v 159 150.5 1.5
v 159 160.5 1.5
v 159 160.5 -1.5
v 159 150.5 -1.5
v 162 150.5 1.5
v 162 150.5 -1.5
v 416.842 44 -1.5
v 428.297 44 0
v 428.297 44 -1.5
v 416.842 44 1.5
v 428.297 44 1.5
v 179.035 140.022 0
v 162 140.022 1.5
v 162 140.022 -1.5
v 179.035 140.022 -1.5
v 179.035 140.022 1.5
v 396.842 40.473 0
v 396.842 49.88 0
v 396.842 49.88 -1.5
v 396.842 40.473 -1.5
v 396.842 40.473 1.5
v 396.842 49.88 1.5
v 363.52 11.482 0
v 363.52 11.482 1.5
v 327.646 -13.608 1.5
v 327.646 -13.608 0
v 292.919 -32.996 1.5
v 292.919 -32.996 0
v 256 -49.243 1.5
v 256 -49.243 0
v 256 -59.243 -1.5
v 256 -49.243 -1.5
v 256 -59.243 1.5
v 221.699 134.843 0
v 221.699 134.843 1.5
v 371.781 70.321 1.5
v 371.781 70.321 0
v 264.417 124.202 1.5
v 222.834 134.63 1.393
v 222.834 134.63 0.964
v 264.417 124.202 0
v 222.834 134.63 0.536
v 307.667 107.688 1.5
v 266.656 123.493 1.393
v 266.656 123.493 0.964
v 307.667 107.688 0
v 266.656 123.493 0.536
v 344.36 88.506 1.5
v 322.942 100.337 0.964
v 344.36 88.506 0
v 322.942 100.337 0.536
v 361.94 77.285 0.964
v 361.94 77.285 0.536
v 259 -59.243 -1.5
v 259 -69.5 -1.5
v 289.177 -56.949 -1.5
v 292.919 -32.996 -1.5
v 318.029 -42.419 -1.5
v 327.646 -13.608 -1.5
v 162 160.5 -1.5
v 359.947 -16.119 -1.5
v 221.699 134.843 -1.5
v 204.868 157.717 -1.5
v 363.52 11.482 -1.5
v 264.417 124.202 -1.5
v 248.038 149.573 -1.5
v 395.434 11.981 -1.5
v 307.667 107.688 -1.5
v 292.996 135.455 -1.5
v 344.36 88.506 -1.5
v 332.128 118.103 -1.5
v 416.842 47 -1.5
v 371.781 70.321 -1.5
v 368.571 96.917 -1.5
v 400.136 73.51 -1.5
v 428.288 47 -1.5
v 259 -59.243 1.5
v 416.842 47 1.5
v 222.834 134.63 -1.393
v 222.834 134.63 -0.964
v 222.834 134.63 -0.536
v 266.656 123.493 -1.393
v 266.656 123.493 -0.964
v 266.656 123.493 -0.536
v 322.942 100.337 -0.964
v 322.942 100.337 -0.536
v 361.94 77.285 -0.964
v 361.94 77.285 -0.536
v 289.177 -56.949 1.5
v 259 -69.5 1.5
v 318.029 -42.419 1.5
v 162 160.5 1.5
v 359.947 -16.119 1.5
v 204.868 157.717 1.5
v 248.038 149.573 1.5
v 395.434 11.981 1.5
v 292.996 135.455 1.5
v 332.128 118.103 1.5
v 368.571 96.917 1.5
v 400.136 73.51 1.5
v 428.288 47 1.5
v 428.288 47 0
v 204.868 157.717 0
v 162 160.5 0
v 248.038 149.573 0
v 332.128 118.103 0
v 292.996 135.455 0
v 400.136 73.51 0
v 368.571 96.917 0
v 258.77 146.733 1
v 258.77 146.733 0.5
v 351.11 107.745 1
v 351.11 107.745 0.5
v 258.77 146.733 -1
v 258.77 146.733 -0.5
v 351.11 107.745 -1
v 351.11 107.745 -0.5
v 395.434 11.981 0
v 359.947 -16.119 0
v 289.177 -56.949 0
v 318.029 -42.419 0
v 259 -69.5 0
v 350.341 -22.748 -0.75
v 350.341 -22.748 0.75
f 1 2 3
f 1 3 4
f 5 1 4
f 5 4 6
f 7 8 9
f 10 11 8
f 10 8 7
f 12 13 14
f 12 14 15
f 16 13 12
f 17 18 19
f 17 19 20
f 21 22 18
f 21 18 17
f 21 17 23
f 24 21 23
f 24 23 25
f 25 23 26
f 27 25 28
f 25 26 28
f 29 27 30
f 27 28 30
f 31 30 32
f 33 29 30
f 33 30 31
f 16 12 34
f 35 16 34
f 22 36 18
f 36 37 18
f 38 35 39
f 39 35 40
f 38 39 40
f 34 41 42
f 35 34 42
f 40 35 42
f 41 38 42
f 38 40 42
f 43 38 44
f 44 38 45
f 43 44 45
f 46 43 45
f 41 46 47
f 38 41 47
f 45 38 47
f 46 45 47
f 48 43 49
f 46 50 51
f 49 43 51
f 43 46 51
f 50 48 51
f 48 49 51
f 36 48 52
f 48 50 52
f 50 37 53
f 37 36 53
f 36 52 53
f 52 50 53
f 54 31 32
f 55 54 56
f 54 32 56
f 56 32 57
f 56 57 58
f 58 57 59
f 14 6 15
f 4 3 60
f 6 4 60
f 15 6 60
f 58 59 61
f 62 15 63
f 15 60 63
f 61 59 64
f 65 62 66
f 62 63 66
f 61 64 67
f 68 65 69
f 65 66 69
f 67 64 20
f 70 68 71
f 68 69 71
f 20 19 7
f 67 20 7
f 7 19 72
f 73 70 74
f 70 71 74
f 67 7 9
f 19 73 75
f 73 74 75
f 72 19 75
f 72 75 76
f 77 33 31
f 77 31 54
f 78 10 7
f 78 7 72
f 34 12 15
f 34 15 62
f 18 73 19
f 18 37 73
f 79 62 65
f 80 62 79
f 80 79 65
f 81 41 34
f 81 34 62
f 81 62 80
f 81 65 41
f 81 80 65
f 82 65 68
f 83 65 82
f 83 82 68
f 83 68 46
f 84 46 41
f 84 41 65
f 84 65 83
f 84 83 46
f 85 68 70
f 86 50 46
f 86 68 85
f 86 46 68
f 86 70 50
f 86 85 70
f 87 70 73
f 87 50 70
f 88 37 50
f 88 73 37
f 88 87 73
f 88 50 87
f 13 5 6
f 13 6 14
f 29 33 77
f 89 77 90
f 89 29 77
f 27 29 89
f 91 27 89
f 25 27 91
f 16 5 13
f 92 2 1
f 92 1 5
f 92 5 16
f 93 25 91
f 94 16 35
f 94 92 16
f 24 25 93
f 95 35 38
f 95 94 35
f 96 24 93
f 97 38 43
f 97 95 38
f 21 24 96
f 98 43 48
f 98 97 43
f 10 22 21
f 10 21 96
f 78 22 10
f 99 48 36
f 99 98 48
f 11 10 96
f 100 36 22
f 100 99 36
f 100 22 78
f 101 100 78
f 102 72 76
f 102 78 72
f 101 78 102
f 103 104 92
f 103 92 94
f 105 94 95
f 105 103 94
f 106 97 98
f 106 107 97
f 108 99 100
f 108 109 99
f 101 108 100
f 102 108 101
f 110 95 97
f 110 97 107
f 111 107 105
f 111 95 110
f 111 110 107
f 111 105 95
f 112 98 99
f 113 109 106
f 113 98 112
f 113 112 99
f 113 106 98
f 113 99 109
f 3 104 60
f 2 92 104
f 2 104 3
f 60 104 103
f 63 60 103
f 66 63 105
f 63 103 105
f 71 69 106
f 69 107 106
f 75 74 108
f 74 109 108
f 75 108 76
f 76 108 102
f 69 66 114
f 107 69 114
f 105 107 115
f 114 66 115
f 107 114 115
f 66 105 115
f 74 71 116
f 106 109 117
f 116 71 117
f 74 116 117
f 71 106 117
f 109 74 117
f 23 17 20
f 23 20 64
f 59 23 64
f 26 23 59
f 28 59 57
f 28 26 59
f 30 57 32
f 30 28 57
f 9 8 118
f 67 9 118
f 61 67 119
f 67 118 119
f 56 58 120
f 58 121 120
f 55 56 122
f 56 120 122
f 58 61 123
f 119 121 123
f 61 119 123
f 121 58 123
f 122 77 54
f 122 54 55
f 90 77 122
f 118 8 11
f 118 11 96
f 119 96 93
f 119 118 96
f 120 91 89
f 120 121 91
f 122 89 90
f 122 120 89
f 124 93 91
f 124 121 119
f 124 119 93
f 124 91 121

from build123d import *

# Parameters (mm, degrees)
BOSS_EXTRUDE1_DEPTH = 1.5


with BuildPart() as part:
    # Sketch1 → Boss-Extrude1 (new, symmetric)
    with BuildSketch(Plane.XY):
        with BuildLine():
            Line((162, 160.5), (159, 160.5))
            Line((159, 160.5), (159, 150.5))
            Line((159, 150.5), (162, 150.5))
            Line((162, 150.5), (162, 140.021619695))
            Line((162, 140.021619695), (179.035361639, 140.021619695))
            add(Edge.make_bspline(
                [(179.035361639, 140.021619695), (181.45177758, 139.887166151), (186.271210948, 139.563639144), (195.976712465, 138.692648533), (208.159899275, 137.190549701), (222.833276173, 134.736731876), (242.399897845, 130.612978325), (266.747664338, 123.892143887), (295.413182721, 113.431330715), (323.15664222, 100.694908753), (345.202971848, 88.292281007), (362.016251386, 77.366035054), (374.171038921, 68.686714489), (383.882043125, 61.067655319), (391.384292246, 54.745059633), (395.0336858, 51.518085922), (396.841652361, 49.879913246)],
                knots=[0.062605333, 0.062605333, 0.062605333, 0.062605333, 0.088988821, 0.115372309, 0.168139285, 0.220906261, 0.273673237, 0.379207188, 0.48474114, 0.590275092, 0.695809044, 0.74857602, 0.801342996, 0.854109972, 0.88049346, 0.906876948, 0.906876948, 0.906876948, 0.906876948], degree=3))
            Line((396.841652361, 49.879913246), (396.841652361, 40.472770569))
            add(Edge.make_bspline(
                [(396.841652361, 40.472770569), (394.239003506, 37.959600968), (388.961437182, 32.990250996), (378.229519379, 23.387370863), (364.429910112, 11.961116868), (347.266061507, -0.817277542), (329.48749774, -12.672358947), (311.087845987, -23.607837965), (292.061194965, -33.626734895), (275.670510367, -41.216070972), (263.560614549, -46.277800338), (258.079868533, -48.44047437), (255.999999882, -49.243263144)],
                knots=[0.498678358, 0.498678358, 0.498678358, 0.498678358, 0.498869027, 0.499059696, 0.499441034, 0.499822372, 0.50020371, 0.500585048, 0.500966386, 0.501347724, 0.501538394, 0.501654418, 0.501654418, 0.501654418, 0.501654418], degree=3))
            Line((255.999999882, -49.243263144), (256, -59.243263104))
            Line((256, -59.243263104), (259, -59.243263104))
            Line((259, -59.243263104), (259, -69.5))
            add(Edge.make_bspline(
                [(428.29663113, 44), (357.033753936, -32.746716062), (259, -69.5)],
                knots=[0, 0, 0, 1, 1, 1], degree=2))
            Line((428.29663113, 44), (416.841652361, 44))
            Line((416.841652361, 44), (416.841652361, 47))
            Line((416.841652361, 47), (428.287791795, 47.000000003))
            add(Edge.make_bspline(
                [(162, 160.5), (257.407389322, 160.5), (362.26969339, 117.467207351), (428.287791795, 47.000000003)],
                knots=[0, 0, 0, 0, 0.992973687, 0.992973687, 0.992973687, 0.992973687], degree=3))
        make_face()
    extrude(amount=BOSS_EXTRUDE1_DEPTH, both=True)


solid = part.part
